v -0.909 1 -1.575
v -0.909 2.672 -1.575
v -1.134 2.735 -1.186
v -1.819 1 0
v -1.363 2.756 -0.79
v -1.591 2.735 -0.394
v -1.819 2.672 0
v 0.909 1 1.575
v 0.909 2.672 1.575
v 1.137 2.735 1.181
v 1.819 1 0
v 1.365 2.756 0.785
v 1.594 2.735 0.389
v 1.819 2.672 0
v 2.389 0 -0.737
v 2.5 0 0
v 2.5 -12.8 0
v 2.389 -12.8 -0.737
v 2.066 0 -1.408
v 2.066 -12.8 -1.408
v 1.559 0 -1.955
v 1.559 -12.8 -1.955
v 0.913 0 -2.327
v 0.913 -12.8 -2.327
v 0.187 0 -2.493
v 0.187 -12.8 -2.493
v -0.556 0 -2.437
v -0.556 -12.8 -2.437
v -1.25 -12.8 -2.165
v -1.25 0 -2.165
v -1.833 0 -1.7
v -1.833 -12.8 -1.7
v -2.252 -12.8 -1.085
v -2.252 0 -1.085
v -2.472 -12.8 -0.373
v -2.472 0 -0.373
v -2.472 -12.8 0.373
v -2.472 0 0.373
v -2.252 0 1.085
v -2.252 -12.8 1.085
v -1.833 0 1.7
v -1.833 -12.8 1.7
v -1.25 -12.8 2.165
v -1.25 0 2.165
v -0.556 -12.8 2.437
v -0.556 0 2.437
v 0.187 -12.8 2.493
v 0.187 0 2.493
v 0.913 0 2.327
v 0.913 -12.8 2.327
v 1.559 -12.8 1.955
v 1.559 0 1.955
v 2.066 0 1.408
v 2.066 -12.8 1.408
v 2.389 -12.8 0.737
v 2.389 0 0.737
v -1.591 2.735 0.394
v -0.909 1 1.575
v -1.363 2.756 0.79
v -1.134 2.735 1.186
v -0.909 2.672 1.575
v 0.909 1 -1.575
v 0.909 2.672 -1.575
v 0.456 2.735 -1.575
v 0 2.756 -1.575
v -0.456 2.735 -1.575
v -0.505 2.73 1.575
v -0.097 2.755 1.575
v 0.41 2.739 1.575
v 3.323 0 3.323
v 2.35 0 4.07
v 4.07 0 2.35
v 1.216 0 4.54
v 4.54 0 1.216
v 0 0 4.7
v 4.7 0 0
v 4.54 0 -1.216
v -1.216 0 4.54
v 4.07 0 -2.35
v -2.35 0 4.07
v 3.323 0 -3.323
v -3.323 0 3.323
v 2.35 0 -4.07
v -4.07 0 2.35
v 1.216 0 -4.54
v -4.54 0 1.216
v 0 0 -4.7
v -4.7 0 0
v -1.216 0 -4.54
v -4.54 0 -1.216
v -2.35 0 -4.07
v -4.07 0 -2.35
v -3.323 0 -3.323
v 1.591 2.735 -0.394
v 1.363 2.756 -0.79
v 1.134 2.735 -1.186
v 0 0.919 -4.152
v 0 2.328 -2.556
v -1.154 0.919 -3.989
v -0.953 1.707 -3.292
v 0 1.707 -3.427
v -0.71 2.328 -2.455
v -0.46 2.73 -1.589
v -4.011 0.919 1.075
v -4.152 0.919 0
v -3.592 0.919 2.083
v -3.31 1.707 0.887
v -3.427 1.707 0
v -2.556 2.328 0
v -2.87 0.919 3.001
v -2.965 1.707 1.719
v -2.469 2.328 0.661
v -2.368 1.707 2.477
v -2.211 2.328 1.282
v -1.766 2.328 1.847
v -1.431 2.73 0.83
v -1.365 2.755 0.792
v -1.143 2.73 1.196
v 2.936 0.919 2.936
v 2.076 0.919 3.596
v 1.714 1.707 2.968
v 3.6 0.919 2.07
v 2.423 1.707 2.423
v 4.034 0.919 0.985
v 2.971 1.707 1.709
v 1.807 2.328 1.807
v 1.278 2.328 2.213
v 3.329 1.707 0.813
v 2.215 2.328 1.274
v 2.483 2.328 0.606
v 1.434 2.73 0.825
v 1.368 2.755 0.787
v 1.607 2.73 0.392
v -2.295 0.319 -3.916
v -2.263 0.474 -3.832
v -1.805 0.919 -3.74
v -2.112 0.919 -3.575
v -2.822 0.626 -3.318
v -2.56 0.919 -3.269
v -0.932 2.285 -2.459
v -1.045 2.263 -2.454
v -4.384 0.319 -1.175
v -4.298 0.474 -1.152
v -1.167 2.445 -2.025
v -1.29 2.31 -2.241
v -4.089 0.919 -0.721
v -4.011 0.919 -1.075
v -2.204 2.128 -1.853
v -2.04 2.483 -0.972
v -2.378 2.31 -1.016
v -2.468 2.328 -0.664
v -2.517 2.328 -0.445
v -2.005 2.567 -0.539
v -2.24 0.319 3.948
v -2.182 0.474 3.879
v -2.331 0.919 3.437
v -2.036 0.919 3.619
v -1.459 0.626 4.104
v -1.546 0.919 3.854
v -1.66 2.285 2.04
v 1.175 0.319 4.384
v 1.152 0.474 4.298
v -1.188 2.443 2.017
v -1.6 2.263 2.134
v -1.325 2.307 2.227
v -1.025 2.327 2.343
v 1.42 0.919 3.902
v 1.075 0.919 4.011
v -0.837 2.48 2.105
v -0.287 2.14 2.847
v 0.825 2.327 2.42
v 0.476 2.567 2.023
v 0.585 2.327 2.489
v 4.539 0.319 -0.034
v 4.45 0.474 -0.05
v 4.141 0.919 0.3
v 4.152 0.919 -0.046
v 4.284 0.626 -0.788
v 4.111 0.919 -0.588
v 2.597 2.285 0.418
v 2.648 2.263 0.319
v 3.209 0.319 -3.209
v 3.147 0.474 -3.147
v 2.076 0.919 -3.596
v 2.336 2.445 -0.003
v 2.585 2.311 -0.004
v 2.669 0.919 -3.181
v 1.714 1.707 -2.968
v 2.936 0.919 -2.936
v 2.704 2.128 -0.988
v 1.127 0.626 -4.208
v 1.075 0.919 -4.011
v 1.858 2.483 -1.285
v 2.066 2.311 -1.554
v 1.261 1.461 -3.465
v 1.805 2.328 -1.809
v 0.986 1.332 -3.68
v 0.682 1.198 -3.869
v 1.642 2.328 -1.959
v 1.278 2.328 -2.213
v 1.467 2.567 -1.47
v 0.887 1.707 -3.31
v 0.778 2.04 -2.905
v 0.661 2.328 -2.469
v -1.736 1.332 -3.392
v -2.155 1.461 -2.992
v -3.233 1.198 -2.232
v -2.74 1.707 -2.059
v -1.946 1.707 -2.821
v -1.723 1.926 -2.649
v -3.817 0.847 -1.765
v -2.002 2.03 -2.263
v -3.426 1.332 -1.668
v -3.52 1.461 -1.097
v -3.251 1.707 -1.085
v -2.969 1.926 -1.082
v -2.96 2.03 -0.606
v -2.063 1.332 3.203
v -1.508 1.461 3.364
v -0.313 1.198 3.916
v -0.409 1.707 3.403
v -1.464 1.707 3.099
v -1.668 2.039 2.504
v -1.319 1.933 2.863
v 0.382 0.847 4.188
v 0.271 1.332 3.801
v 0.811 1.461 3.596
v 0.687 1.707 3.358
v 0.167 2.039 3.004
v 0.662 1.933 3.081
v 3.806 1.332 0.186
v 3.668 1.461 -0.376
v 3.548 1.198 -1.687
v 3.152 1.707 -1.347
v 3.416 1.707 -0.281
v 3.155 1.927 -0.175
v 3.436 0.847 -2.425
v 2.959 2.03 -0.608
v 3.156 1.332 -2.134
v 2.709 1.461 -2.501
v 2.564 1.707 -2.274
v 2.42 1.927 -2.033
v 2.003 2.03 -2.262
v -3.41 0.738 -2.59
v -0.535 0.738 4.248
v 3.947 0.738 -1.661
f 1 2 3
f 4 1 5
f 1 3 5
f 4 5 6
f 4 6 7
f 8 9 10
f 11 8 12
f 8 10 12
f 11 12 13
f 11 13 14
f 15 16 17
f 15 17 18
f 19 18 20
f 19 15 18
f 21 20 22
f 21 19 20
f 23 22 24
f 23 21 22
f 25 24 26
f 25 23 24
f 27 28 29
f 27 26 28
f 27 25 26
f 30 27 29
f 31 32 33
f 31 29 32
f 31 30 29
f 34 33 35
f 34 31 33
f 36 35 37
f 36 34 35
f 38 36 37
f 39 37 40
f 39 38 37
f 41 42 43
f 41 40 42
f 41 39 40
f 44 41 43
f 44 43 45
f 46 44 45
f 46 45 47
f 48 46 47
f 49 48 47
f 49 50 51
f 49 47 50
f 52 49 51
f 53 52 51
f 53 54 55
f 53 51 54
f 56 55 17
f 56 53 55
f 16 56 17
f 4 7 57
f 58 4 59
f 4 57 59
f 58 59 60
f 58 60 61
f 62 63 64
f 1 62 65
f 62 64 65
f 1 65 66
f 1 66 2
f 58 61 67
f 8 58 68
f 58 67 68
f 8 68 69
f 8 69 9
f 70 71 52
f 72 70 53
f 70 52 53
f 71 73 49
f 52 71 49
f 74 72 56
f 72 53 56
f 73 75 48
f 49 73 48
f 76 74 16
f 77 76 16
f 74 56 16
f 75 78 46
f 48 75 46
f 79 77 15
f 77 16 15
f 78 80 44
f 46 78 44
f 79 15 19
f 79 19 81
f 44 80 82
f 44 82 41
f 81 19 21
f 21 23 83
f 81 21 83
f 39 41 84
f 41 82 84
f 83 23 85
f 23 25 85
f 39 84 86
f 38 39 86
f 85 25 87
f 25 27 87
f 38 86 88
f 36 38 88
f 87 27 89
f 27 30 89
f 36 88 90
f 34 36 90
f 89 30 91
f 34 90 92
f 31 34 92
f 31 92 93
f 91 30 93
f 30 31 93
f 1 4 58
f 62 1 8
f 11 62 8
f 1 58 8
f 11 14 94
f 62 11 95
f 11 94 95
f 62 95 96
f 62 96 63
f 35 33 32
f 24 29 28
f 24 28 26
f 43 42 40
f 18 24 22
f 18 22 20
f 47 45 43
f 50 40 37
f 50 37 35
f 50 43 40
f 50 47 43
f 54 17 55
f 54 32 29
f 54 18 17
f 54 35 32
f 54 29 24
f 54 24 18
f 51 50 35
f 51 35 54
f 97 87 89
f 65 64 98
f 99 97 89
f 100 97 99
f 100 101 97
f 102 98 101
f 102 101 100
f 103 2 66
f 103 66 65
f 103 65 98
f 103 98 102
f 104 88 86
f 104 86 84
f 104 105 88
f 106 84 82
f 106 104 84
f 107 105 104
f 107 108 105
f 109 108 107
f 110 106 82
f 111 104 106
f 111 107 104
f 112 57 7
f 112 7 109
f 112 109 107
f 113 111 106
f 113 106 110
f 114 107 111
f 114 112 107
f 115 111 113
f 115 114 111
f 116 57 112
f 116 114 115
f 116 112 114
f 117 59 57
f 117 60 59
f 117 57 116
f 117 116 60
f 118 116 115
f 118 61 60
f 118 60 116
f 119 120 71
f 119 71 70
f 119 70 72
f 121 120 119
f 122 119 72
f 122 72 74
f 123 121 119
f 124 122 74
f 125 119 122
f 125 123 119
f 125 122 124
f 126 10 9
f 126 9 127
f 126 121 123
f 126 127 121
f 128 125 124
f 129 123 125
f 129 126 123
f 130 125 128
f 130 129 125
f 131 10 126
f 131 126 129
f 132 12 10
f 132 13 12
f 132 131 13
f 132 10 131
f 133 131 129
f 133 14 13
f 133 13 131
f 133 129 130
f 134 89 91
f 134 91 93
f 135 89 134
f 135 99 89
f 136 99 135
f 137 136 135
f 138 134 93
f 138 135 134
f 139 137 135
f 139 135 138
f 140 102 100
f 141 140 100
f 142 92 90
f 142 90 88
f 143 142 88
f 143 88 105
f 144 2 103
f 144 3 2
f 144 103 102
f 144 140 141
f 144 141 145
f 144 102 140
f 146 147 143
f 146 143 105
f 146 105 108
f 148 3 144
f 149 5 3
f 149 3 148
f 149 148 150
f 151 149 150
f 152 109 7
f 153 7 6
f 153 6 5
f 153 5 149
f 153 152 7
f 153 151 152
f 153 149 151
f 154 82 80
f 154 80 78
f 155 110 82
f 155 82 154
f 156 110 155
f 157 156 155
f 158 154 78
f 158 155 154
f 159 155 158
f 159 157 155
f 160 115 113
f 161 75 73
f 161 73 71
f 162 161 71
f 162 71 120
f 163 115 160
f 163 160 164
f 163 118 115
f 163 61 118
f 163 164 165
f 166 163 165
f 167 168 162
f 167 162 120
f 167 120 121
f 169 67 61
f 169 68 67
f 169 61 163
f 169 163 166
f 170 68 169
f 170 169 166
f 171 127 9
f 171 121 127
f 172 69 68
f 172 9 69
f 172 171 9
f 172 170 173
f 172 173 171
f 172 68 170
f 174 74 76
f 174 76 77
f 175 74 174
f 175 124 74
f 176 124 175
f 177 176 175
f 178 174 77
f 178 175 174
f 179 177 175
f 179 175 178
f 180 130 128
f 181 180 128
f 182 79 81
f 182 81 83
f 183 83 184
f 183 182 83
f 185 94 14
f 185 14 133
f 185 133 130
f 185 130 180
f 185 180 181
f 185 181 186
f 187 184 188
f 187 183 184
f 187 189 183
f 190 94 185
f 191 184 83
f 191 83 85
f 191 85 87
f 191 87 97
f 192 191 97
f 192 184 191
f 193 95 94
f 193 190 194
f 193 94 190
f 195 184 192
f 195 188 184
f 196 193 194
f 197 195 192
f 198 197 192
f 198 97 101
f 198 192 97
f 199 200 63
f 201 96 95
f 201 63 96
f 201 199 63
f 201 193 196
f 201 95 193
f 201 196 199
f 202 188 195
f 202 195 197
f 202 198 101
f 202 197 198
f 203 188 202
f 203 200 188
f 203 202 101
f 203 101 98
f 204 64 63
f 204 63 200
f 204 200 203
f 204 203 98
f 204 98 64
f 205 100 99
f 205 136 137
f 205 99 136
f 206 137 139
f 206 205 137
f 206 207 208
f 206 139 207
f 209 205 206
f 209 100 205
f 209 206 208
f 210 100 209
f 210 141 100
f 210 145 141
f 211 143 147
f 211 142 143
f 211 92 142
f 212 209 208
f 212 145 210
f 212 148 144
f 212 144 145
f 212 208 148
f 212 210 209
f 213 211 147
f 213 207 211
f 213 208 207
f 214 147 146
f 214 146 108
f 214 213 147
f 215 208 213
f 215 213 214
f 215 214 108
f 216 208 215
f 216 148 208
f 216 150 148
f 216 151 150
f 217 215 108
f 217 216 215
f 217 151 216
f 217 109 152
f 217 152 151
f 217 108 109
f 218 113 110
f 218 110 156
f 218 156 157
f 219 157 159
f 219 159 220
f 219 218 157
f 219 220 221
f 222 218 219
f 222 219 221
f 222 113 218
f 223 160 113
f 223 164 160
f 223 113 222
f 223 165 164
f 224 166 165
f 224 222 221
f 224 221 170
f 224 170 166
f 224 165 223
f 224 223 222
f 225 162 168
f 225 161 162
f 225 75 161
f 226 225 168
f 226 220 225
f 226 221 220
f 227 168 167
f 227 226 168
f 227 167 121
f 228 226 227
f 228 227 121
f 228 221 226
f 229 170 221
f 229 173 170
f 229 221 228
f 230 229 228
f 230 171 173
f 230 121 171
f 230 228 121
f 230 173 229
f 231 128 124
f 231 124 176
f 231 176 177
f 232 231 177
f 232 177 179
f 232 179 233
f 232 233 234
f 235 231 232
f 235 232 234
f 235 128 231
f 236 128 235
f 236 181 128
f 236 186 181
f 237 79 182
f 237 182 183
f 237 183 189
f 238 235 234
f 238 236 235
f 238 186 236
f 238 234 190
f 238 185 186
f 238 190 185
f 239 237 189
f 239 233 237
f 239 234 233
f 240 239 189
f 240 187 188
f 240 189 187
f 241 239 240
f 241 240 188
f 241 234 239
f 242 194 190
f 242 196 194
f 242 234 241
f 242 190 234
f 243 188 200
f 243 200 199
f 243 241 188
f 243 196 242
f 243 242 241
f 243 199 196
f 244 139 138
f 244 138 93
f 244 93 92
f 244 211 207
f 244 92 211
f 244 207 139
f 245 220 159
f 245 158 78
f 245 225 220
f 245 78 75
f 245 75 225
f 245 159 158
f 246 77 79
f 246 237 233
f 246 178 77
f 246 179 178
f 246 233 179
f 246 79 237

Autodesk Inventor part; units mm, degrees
ref_plane "YZ Plane" through (0, 0, 0) normal (1, 0, 0) x (0, 1, 0)
ref_plane "XZ Plane" through (0, 0, 0) normal (0, 1, 0) x (-1, 0, 0)
sketch "Sketch1" plane through (0, 0, 0) normal (1, 0, 0) x (0, 1, 0)
  line L0 (0, 0) -> (0, -4.7)
  line L1 (0, 0) -> (3, 0)
  arc A0 (0, -4.7) -> (3, 0) centre (-2.1737, -0.0051) ccw
  dimension "d0" = 4.7
  dimension "d1" = 3
revolve "Revolution1" add sketch "Sketch1" angle 360 about axis through (0, 0, 0) along (0, 1, 0)
sketch "Sketch2" plane through (0, 0, 0) normal (0, -1, 0) x (1, 0, 0)
  circle A0 centre (0, 0) radius 2.5
  dimension "d3" = 5
extrude "Extrusion1" add sketch "Sketch2" along normal blind 12.8
thread "Thread1" size "M5x0.8" class "6g" standard "ANSI Metric M Profile" full length
ref_plane "Work Plane1" through (0, 3, 0) normal (0, -1, 0) x (1, 0, 0)
sketch "Sketch3" plane through (0, 3, 0) normal (0, -1, 0) x (1, 0, 0)
  line L0 (0, 0) -> (0, -1.575)
  circle A0 centre (0, 0) radius 2.5 projected
  line L1 (-0.9093, -1.575) -> (-1.8187, 0)
  line L2 (-1.8187, 0) -> (-0.9093, 1.575)
  line L3 (-0.9093, 1.575) -> (0.9093, 1.575)
  line L4 (0.9093, 1.575) -> (1.8187, 0)
  line L5 (1.8187, 0) -> (0.9093, -1.575)
  line L6 (0.9093, -1.575) -> (-0.9093, -1.575)
  dimension "d9" = 1.575
extrude "Extrusion2" cut sketch "Sketch3" along normal blind 2 contours L1 L2 L3 L4 L5 L6
properties part number "Screw"
